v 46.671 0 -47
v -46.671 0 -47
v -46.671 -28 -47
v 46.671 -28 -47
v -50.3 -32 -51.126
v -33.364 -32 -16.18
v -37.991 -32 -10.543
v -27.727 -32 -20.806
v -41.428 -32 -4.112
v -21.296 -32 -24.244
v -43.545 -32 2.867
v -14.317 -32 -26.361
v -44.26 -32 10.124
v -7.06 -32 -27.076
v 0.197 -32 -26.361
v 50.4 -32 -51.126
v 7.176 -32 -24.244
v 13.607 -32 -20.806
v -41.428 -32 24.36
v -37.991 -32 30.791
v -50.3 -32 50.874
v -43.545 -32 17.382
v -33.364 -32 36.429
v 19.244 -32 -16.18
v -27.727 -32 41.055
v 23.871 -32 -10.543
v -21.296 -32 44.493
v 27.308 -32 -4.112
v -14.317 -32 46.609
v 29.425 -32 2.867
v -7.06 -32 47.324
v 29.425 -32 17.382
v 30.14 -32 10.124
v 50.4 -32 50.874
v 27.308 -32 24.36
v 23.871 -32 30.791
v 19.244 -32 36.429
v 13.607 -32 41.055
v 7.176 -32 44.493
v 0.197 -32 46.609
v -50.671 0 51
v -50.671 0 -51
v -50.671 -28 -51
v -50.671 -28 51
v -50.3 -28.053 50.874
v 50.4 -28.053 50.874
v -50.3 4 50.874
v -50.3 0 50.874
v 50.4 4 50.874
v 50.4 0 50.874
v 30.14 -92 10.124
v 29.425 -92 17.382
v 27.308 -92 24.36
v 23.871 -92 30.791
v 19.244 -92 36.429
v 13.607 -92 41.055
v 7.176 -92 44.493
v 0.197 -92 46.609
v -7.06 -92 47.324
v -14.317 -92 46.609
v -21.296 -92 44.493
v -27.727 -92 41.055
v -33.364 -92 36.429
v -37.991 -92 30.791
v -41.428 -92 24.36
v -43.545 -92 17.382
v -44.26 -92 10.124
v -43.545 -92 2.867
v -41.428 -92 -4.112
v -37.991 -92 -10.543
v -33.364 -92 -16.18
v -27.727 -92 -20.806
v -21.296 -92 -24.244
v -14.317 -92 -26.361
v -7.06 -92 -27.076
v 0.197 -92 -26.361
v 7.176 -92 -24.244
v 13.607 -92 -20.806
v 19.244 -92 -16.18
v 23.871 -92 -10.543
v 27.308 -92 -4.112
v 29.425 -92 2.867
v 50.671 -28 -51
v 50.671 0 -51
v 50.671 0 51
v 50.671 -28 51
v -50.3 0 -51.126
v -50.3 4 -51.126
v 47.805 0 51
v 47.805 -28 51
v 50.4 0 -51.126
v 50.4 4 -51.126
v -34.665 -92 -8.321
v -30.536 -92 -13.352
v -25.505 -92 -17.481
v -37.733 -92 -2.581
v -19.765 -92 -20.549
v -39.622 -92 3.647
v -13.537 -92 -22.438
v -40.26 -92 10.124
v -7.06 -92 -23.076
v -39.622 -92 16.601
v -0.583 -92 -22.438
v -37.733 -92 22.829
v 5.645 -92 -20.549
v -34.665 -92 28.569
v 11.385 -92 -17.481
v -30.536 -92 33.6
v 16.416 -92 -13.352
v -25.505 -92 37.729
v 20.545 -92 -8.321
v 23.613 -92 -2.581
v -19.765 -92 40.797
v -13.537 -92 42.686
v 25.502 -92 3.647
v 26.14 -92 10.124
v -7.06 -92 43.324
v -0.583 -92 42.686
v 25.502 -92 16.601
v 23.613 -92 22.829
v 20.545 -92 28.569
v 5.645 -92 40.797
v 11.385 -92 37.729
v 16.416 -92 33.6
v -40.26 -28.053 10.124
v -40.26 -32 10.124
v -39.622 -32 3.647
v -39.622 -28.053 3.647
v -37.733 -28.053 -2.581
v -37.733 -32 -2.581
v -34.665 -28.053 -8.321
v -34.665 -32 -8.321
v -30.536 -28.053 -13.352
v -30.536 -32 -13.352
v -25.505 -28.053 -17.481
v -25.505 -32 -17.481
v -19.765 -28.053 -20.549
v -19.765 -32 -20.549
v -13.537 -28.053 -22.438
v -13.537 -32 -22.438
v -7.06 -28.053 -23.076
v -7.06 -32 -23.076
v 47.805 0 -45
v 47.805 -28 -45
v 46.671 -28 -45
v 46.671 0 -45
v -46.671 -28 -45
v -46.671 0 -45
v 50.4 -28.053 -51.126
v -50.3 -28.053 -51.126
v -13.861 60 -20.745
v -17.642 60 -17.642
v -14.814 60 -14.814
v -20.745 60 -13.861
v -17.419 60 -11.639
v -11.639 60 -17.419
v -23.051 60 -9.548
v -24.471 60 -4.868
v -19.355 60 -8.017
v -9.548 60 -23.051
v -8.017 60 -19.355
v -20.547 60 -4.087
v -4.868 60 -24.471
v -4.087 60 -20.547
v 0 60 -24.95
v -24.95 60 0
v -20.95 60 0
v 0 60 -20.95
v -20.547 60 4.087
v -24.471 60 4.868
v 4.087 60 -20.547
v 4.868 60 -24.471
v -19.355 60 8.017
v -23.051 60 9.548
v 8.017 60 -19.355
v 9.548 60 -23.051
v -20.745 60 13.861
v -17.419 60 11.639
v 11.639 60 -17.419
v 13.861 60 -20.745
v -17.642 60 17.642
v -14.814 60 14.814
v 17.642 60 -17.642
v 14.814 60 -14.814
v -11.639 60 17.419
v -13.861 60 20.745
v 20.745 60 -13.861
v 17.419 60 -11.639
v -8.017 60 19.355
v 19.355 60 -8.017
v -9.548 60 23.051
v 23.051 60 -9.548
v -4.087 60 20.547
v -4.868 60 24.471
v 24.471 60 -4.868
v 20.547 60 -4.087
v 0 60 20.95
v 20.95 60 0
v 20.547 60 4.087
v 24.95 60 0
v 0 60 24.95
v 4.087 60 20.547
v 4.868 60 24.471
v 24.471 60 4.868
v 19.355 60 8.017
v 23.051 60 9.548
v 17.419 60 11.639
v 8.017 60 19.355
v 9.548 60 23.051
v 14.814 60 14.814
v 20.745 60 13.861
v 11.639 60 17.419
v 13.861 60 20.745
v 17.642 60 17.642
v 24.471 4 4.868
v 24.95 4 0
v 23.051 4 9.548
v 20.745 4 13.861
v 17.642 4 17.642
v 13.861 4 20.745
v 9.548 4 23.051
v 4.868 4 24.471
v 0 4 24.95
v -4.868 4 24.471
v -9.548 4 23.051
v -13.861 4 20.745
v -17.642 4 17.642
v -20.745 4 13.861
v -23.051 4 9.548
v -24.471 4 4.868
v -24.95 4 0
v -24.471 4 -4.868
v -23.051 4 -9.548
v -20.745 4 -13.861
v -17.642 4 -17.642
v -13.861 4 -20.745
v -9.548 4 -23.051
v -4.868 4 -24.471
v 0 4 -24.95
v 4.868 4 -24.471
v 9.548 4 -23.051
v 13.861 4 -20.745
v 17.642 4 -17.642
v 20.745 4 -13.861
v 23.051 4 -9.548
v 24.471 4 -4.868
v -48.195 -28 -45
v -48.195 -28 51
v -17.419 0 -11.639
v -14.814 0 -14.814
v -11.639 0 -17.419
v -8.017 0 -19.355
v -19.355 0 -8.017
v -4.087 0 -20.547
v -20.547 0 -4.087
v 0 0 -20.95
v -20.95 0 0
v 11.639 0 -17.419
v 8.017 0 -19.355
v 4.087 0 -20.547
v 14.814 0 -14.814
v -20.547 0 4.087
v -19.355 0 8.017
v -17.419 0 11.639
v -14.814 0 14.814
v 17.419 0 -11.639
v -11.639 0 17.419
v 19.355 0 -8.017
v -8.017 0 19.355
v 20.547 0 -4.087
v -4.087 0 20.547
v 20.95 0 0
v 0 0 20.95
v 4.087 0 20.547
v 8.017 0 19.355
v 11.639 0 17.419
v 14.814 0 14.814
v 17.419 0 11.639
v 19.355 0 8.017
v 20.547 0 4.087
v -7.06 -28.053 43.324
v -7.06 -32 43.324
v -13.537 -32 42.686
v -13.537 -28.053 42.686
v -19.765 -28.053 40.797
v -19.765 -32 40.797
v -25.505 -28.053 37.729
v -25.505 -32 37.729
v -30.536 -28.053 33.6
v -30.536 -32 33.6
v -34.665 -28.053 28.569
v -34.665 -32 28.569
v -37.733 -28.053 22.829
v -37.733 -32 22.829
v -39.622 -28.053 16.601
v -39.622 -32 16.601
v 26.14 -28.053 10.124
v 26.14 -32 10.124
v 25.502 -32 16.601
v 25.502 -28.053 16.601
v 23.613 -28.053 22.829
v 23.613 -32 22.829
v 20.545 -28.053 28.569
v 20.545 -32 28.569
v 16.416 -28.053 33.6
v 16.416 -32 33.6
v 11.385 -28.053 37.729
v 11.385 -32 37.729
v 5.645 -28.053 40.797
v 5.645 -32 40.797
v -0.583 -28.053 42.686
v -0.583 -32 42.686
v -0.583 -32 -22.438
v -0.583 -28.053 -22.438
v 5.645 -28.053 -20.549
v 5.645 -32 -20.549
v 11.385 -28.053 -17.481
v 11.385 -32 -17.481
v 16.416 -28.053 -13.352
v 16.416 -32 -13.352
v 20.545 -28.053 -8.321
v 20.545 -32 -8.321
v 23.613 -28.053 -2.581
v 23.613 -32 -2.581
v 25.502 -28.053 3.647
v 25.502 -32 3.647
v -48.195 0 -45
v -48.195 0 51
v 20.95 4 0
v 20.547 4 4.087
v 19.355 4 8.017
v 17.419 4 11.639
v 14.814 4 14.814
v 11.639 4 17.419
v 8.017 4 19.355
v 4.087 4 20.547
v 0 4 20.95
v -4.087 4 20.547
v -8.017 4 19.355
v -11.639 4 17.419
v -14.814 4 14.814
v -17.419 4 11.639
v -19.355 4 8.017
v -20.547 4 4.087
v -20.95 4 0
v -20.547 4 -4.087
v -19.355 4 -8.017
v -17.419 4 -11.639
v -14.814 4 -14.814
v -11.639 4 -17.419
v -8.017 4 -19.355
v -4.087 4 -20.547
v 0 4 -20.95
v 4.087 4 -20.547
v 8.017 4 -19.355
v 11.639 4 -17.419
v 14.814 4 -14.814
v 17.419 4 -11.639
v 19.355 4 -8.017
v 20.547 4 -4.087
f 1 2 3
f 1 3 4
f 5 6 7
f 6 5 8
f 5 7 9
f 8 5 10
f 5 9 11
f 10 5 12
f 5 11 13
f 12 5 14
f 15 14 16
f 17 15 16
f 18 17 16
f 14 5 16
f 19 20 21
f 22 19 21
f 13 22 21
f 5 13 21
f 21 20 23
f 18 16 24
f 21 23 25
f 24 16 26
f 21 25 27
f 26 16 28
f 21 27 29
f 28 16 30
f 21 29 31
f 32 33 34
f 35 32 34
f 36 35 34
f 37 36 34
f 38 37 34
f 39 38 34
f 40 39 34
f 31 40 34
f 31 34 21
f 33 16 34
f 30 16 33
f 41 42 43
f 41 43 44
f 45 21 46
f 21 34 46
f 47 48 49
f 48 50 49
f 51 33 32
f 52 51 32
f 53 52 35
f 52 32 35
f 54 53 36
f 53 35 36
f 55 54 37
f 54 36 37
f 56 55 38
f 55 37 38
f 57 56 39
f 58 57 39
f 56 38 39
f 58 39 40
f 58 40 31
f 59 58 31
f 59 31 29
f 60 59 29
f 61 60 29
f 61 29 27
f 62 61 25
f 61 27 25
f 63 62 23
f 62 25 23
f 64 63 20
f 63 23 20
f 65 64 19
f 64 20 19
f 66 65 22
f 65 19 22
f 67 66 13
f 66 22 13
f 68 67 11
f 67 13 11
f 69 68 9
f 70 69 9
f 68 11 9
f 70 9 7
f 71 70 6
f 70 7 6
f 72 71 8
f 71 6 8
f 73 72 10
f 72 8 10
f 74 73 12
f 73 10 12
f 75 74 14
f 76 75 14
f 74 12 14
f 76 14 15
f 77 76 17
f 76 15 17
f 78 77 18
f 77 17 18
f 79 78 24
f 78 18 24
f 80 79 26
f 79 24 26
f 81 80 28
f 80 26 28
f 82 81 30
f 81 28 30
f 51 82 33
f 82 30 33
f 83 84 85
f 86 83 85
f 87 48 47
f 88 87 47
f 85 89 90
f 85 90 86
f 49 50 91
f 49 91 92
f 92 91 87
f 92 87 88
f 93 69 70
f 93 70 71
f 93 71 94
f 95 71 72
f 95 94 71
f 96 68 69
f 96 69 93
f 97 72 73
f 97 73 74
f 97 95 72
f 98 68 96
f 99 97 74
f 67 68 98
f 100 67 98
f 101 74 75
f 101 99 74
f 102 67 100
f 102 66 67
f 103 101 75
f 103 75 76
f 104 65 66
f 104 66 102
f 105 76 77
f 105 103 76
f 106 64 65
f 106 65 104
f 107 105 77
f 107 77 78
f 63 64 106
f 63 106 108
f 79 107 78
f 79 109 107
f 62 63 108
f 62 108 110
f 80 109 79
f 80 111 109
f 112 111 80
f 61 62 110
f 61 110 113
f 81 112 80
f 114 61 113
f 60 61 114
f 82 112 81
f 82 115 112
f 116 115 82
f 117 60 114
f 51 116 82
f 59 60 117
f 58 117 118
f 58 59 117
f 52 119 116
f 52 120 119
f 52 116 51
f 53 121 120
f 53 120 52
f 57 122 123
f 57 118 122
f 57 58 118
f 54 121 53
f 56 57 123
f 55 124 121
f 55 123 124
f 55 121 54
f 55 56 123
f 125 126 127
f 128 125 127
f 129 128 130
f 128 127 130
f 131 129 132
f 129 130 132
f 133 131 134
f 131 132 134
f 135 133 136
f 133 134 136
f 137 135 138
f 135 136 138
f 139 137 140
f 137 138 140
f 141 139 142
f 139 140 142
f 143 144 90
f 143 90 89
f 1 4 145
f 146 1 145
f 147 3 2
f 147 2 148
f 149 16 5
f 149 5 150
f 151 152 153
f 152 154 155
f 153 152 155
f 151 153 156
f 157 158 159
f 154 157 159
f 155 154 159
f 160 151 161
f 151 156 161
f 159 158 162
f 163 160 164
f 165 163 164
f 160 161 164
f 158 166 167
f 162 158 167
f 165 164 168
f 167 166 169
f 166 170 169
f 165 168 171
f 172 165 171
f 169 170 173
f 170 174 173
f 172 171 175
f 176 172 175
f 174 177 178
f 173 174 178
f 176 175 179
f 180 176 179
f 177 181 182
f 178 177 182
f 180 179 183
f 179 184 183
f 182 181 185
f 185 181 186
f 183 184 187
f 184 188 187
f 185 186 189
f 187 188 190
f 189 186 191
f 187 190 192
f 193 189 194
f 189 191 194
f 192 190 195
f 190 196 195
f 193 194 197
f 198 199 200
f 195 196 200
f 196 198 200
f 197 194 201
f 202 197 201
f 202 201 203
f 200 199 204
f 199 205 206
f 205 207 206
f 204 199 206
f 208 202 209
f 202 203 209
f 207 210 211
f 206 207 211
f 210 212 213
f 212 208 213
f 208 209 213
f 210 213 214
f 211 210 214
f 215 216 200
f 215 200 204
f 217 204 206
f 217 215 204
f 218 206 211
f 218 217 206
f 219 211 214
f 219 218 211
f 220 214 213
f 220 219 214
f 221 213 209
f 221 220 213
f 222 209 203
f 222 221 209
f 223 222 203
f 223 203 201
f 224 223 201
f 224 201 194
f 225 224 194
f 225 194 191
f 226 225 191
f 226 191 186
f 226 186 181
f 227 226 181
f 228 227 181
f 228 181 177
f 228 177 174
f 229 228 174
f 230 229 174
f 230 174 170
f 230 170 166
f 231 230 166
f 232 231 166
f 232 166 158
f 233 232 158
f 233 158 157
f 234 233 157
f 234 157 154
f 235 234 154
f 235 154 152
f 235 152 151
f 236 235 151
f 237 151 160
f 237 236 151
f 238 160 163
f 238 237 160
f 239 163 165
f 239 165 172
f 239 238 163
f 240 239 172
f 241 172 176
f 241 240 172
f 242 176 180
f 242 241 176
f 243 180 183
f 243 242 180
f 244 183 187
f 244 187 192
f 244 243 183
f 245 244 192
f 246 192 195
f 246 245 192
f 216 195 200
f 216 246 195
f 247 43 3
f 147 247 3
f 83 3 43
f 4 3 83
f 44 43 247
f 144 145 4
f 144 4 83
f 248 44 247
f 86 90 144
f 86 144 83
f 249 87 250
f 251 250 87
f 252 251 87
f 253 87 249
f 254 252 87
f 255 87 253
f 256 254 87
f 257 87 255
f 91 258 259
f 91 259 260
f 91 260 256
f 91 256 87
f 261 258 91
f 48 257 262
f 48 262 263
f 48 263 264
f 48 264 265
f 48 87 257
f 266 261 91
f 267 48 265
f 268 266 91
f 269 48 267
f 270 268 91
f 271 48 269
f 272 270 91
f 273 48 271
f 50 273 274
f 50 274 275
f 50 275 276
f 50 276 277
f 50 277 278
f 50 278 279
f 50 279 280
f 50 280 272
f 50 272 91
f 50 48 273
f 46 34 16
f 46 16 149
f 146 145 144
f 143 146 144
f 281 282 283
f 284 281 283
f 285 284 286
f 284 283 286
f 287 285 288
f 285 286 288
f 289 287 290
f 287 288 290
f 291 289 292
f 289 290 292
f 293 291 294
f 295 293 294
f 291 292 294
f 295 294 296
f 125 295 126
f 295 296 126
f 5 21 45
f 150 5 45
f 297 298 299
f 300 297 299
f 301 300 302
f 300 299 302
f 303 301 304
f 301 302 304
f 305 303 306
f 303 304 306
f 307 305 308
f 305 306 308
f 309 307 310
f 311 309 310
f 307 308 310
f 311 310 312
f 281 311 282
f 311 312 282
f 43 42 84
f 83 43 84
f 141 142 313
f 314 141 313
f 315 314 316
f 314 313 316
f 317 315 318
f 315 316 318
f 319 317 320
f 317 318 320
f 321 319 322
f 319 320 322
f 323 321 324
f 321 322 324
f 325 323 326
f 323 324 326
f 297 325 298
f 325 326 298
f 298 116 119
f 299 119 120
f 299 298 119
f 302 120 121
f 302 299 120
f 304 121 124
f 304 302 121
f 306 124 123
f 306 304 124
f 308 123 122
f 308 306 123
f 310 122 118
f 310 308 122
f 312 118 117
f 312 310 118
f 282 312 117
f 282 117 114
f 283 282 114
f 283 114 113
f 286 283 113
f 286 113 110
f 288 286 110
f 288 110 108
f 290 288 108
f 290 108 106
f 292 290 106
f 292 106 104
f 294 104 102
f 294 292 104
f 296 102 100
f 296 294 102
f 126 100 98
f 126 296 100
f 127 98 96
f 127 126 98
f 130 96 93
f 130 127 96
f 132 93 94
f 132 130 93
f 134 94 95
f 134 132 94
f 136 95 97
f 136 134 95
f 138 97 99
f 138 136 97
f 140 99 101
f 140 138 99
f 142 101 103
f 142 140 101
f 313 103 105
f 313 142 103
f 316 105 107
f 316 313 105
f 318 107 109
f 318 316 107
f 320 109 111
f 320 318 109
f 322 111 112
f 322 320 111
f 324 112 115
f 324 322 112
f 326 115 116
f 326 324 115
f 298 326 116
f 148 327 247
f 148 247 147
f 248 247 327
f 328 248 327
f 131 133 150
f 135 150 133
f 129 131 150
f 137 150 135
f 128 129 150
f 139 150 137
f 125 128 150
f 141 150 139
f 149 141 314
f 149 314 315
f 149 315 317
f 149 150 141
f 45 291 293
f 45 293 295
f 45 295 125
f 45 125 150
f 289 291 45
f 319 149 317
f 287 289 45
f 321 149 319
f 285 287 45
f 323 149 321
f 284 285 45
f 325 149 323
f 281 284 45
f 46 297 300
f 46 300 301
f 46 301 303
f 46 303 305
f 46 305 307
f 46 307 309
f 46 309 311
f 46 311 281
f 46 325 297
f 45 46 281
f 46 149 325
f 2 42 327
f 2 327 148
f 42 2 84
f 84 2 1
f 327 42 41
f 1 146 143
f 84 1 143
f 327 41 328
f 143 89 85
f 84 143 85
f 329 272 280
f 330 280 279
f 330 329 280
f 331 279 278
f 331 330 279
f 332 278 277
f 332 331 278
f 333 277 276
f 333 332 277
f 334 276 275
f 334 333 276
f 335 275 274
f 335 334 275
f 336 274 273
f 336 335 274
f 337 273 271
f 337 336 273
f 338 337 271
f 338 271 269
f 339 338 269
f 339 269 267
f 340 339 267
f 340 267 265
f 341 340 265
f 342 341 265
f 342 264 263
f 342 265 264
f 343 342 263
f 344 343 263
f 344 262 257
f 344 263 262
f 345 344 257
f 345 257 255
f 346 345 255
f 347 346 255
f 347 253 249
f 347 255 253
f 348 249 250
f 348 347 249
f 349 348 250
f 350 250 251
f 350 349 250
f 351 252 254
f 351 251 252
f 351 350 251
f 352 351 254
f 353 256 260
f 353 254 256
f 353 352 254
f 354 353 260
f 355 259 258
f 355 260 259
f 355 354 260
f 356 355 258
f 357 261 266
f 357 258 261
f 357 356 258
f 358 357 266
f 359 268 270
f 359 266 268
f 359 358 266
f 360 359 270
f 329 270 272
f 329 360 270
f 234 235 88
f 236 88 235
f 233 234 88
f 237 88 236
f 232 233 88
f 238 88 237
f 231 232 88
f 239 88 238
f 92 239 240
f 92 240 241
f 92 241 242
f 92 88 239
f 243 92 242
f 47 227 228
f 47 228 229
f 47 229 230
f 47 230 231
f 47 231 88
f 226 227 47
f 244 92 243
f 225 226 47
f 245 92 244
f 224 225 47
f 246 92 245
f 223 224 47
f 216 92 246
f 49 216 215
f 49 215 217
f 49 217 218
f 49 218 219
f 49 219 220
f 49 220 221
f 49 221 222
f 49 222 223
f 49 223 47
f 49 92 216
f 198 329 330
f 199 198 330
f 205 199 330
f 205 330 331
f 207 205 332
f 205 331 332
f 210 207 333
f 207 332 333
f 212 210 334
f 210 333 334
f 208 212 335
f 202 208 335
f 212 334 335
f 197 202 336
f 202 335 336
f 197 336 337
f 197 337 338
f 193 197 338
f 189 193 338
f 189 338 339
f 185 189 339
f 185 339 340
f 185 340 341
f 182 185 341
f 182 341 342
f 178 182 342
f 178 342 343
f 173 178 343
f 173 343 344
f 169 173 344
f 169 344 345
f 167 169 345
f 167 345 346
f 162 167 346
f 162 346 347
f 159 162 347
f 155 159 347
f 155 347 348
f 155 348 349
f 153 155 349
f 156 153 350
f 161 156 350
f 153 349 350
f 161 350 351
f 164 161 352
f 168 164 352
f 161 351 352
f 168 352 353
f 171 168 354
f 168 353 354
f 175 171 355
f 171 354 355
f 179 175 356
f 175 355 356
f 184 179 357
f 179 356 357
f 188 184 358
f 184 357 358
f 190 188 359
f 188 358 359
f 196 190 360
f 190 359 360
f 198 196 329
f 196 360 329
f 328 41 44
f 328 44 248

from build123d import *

# Parameters (mm, degrees)
F0_W          = 101.342654407
F0_H          = 102
F0_W_2        = 93.342654407
F0_H_2        = 94
F1_DEPTH      = 28
F2_W          = 3.946882084
F2_H          = 101.9999885866
F3_DEPTH      = 50.4
F3_DEPTH_BACK = 50.3
F2_W_2        = 4
F4_W          = 96
F4_H          = 28
F5_DEPTH      = 96
F7_DEPTH      = 5
F8_R          = 37.2
F8_R_2        = 33.2
F9_DEPTH      = 60
F10_R         = 24.95
F10_R_2       = 20.95
F11_DEPTH     = 60
F12_DEPTH     = 55.8


with BuildPart() as f1:
    # F0 (on Front) → F1 (new body)
    with BuildSketch(Plane.XZ):
        Rectangle(F0_W, F0_H)
        Rectangle(F0_W_2, F0_H_2, mode=Mode.SUBTRACT)
    extrude(amount=F1_DEPTH)

    # F4 (on face) → F5 (cut)
    with BuildSketch(Plane.XY.offset(51)):
        with Locations((-0.1949560344, -14)):
            Rectangle(F4_W, F4_H)
    extrude(amount=-F5_DEPTH, mode=Mode.SUBTRACT)


with BuildPart() as f3:
    # F2 (on Right) → F3 (new body, two sides)
    with BuildSketch(Plane.YZ) as f3_sk:
        with Locations((-30.026558958, -0.1257993281)):
            Rectangle(F2_W, F2_H)
    extrude(amount=F3_DEPTH)
    extrude(f3_sk.sketch, amount=-F3_DEPTH_BACK)

    # F6 (on face) → F7 (cut)
    with BuildSketch(Plane.XZ.offset(32)):
        with BuildLine():
            Line((-7.06, 10.1242063786), (-7.06, 43.3242063786))
            ThreePointArc((-7.06, 43.3242063786), (-30.5359451354, 33.600151514), (-40.26, 10.1242063786))
            Line((-40.26, 10.1242063786), (-7.06, 10.1242063786))
        make_face()
        with BuildLine():
            ThreePointArc((26.14, 10.1242063786), (16.4159451354, 33.600151514), (-7.06, 43.3242063786))
            Line((-7.06, 43.3242063786), (-7.06, 10.1242063786))
            Line((-7.06, 10.1242063786), (26.14, 10.1242063786))
        make_face()
        with BuildLine():
            Line((26.14, 10.1242063786), (-7.06, 10.1242063786))
            Line((-7.06, 10.1242063786), (-7.06, -23.0757936214))
            ThreePointArc((-7.06, -23.0757936214), (16.4159451354, -13.3517387568), (26.14, 10.1242063786))
        make_face()
        with BuildLine():
            Line((-7.06, -23.0757936214), (-7.06, 10.1242063786))
            Line((-7.06, 10.1242063786), (-40.26, 10.1242063786))
            ThreePointArc((-40.26, 10.1242063786), (-30.5359451354, -13.3517387568), (-7.06, -23.0757936214))
        make_face()
    extrude(amount=-F7_DEPTH, mode=Mode.SUBTRACT)

    # F8 (on face) → F9 (join)
    with BuildSketch(Plane.XZ.offset(32)):
        with Locations((-7.06, 10.1242063786)):
            Circle(F8_R)
        with Locations((-7.06, 10.1242063786)):
            Circle(F8_R_2, mode=Mode.SUBTRACT)
    extrude(amount=F9_DEPTH)


with BuildPart() as f3b:
    # F2 (on Right) → F3, piece 2 (new body, two sides)
    with BuildSketch(Plane.YZ) as f3_2_sk:
        with Locations((2, -0.1257993281)):
            Rectangle(F2_W_2, F2_H)
    extrude(amount=F3_DEPTH)
    extrude(f3_2_sk.sketch, amount=-F3_DEPTH_BACK)

    # F10 (on Front) → F11 (join)
    with BuildSketch(Plane.XZ):
        Circle(F10_R)
        Circle(F10_R_2, mode=Mode.SUBTRACT)
    extrude(amount=-F11_DEPTH)

    # F12 (cut): faces of the model
    f12_faces = [f3b.faces().sort_by_distance(p)[0] for p in [
        (0, 4, 0),
        (0, 4, 0),
    ]]
    extrude(f12_faces, amount=-F12_DEPTH, mode=Mode.SUBTRACT)


solid = Compound([f1.part, f3.part, f3b.part])
